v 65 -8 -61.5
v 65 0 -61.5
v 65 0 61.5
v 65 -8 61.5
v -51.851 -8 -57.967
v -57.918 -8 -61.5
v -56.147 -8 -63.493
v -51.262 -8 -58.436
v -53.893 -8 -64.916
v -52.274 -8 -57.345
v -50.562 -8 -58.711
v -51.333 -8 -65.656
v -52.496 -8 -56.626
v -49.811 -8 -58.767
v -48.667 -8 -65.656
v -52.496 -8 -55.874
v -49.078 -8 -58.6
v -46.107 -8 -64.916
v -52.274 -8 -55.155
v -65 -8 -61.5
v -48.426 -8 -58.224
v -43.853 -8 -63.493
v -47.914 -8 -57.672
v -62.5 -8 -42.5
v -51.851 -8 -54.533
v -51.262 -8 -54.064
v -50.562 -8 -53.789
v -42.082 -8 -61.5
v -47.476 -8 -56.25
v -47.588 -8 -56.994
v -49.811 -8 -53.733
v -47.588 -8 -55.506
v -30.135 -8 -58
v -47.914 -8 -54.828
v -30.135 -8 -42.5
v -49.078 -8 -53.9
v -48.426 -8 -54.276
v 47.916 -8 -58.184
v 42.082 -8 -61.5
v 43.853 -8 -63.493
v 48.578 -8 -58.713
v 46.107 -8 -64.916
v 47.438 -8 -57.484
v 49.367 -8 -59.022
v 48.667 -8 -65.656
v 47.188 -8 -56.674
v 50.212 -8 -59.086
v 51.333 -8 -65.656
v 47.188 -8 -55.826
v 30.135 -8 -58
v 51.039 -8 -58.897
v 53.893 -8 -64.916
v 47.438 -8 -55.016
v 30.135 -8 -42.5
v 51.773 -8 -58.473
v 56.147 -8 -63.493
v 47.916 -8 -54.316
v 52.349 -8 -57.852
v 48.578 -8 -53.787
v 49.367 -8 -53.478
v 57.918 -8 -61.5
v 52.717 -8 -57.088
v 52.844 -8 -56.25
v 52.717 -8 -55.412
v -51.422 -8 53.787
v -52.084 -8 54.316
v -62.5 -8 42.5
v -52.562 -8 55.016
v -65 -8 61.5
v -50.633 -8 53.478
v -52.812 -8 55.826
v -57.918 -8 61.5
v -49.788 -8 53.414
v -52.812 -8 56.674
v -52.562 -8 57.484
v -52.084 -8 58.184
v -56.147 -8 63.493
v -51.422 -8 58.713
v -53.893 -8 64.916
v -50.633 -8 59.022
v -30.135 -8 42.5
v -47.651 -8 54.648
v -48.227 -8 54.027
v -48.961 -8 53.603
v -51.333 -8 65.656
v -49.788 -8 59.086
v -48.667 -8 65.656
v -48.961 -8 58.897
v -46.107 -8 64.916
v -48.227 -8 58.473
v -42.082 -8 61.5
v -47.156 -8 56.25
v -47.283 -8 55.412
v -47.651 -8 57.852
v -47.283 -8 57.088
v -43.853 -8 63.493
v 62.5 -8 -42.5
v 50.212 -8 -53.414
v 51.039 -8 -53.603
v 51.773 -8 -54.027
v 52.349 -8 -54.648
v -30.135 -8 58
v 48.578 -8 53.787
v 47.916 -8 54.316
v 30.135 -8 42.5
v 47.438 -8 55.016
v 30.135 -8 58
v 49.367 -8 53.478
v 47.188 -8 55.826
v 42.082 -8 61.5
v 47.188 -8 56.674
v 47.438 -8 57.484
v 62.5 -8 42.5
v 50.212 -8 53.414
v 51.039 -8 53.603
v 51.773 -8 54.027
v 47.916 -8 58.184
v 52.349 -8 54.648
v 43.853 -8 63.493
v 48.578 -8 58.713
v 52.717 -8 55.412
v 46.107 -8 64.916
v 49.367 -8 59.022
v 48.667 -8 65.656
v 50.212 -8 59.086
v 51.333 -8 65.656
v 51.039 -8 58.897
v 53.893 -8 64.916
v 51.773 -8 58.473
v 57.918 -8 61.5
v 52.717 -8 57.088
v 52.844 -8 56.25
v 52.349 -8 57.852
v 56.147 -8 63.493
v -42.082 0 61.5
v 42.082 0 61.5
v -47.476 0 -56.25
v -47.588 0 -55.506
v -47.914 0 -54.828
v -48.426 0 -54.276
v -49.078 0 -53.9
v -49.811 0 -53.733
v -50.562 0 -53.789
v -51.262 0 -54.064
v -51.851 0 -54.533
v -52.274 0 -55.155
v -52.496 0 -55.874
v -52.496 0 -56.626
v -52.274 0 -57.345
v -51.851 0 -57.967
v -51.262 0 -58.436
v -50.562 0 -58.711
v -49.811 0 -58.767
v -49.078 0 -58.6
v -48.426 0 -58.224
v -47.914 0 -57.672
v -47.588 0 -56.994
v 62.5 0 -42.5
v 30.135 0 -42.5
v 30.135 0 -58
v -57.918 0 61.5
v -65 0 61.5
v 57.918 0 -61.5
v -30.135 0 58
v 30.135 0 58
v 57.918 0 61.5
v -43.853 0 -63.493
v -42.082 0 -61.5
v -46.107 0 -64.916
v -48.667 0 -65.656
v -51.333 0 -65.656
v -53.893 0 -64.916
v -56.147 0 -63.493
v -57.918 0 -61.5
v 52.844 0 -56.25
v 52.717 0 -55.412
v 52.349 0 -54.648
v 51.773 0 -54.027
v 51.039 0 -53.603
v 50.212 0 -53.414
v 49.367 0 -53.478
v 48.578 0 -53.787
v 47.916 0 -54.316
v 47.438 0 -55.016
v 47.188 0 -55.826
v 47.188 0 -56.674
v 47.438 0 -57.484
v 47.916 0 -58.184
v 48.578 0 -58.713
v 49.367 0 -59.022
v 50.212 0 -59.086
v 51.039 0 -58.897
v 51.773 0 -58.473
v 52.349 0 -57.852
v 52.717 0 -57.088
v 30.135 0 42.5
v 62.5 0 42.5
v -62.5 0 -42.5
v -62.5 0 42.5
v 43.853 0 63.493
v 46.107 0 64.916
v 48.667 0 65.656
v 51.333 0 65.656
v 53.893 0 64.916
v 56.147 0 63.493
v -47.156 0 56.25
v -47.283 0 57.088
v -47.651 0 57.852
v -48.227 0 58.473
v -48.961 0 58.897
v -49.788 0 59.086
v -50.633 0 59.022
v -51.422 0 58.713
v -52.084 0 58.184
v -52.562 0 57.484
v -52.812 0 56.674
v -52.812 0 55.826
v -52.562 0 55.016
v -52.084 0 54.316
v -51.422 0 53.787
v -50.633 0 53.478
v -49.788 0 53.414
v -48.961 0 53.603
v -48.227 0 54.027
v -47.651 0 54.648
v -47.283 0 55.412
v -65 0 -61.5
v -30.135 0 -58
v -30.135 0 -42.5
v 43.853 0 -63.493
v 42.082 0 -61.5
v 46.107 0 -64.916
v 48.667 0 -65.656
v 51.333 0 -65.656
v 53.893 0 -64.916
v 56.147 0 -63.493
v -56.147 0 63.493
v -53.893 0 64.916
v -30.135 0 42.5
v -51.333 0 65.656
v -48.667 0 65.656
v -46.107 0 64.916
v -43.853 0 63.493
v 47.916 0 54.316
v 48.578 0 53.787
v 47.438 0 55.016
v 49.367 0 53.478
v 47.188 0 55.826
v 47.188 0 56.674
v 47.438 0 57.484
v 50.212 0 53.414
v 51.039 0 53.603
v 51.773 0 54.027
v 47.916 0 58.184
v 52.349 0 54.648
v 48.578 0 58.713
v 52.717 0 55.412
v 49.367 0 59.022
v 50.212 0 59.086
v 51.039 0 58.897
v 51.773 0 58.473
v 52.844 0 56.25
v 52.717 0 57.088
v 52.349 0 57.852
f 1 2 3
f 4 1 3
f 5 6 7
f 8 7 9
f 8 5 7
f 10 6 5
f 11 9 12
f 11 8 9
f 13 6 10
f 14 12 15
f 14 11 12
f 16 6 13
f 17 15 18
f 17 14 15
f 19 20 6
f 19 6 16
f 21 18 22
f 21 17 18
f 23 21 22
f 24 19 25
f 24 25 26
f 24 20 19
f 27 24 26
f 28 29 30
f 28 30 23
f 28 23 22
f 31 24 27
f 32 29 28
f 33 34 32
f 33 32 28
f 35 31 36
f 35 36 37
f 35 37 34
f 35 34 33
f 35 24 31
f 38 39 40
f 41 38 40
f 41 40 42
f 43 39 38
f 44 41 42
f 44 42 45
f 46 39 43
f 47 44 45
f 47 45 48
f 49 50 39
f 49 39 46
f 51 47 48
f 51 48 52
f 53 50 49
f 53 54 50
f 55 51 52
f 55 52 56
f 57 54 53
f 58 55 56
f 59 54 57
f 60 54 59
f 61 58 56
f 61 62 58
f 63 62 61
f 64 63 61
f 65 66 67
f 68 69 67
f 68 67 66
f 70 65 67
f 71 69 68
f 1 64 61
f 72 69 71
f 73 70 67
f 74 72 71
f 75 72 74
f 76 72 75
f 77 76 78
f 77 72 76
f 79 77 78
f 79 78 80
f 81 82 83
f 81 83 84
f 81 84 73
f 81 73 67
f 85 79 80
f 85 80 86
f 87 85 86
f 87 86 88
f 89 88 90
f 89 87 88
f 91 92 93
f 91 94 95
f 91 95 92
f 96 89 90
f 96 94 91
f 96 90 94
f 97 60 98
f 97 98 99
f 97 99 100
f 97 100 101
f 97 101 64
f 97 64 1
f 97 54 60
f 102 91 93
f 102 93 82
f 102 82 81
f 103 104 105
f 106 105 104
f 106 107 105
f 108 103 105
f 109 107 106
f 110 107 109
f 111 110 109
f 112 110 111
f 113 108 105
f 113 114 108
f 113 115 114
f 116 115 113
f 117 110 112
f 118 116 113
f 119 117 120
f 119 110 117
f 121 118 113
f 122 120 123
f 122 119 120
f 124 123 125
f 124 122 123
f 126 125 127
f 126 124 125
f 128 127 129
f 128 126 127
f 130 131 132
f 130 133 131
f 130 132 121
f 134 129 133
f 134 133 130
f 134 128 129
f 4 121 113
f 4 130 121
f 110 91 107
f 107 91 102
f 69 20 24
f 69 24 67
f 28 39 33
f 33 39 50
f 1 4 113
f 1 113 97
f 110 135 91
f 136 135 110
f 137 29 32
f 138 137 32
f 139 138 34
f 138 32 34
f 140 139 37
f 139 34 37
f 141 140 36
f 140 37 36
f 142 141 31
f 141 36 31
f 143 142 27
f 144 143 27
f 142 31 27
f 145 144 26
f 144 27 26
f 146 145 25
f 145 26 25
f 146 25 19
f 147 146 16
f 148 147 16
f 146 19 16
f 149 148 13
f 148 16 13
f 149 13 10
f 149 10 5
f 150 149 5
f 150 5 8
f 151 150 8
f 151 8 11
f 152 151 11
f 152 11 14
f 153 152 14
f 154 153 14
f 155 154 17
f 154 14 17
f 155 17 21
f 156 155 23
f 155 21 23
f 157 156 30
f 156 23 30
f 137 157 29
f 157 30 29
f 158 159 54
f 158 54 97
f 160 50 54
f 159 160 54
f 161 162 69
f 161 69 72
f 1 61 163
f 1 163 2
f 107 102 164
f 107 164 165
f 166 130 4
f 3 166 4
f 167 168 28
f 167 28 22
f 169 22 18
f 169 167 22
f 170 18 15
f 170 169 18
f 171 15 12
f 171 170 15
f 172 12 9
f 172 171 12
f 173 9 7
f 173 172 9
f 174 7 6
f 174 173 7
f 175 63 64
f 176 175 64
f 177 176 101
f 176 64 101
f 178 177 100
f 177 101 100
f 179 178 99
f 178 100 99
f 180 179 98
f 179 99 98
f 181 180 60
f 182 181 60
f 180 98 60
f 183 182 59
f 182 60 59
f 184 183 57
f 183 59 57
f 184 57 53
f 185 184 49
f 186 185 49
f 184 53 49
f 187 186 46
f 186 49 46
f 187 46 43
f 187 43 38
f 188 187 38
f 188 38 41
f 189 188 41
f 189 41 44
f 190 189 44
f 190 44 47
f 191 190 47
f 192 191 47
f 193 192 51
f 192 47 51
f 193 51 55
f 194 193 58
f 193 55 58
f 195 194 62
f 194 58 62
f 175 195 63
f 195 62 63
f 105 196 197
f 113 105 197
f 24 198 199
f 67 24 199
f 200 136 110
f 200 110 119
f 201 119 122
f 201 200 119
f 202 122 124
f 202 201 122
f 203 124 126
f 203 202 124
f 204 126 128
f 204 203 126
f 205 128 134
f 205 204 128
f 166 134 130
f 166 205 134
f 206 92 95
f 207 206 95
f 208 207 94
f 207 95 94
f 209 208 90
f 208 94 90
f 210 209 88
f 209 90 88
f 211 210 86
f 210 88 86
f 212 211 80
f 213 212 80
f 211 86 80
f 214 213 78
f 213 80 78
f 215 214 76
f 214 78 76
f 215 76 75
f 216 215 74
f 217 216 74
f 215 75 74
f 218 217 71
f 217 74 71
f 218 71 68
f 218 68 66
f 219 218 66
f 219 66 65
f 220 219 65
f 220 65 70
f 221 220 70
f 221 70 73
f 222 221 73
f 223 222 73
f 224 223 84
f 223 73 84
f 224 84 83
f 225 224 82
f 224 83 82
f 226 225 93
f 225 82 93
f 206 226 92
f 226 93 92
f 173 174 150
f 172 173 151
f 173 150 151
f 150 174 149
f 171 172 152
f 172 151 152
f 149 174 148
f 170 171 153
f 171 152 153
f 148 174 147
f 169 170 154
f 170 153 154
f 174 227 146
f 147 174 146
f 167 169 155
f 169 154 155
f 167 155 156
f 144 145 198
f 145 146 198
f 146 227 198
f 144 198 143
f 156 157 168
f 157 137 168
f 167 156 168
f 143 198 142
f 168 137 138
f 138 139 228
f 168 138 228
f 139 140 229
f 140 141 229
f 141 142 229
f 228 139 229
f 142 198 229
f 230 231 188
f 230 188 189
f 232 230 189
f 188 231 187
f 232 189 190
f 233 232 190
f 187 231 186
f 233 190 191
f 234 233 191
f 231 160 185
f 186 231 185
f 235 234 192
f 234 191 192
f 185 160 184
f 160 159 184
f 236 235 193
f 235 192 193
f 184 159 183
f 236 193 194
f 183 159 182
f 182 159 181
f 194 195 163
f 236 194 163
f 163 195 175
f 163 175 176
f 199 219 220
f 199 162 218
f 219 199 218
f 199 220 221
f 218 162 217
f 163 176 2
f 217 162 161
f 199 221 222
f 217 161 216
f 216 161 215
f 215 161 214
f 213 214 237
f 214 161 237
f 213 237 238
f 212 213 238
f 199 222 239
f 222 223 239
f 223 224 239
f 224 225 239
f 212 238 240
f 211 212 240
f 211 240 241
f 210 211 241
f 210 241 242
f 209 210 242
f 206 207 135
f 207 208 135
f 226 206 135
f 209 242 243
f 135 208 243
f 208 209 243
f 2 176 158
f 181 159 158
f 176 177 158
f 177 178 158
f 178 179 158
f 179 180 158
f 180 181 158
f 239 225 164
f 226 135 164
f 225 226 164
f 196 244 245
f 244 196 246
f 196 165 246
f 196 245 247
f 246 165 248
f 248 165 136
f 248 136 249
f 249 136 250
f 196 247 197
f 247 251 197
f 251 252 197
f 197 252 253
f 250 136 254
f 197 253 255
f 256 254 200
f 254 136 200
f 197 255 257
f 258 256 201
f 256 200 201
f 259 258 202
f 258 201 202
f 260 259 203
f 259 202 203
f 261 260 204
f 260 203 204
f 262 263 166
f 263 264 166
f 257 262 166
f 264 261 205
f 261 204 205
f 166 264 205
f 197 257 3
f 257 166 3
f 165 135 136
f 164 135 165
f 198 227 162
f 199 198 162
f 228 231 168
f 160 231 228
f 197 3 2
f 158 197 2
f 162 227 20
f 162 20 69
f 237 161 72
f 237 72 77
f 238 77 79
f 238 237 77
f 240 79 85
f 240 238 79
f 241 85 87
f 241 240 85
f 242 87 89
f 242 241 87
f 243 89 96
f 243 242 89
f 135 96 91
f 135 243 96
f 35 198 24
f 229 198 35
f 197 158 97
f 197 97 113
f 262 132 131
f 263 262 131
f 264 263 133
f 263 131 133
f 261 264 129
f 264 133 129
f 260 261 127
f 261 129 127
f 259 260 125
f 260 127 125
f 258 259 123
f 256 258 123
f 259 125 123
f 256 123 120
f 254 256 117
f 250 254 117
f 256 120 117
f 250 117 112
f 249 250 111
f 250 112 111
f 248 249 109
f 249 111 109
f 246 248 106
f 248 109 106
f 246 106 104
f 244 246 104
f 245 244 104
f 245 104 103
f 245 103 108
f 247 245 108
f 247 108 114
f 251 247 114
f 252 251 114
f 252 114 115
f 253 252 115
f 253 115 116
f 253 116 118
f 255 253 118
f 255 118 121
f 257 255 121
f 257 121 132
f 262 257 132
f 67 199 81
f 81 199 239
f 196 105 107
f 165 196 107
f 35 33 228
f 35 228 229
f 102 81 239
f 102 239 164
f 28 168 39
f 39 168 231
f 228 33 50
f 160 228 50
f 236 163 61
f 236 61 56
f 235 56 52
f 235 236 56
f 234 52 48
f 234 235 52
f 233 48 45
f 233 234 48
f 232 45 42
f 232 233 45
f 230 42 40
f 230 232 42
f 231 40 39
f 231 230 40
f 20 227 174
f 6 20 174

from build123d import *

# Parameters (mm, degrees)
F0_W     = 130
F0_H     = 123
F0_W_2   = 125
F0_H_2   = 85
F1_DEPTH = 8
F2_R     = 2.8435
F2_R_2   = 2.524436
F3_DEPTH = 25
F4_W     = 60.26917
F4_H     = 116
F5_DEPTH = 25
F6_R     = 9.5
F6_R_2   = 2.8435
F6_R_3   = 2.524436
F7_DEPTH = 8


with BuildPart() as f1:
    # F0 (on Front) → F1 (new body)
    with BuildSketch(Plane.XZ):
        Rectangle(F0_W, F0_H)
        Rectangle(F0_W_2, F0_H_2, mode=Mode.SUBTRACT)
    extrude(amount=F1_DEPTH)

    # F2 (on face) → F3 (cut)
    with BuildSketch(Plane.XZ.offset(8)):
        with Locations((-50, 56.25)):
            Circle(F2_R)
        with Locations((50, 56.25)):
            Circle(F2_R)
        with Locations((-50, -56.25)):
            Circle(F2_R_2)
        with Locations((50, -56.25)):
            Circle(F2_R)
    extrude(amount=-F3_DEPTH, mode=Mode.SUBTRACT)

    # F4 (on face) → F5 (cut)
    with BuildSketch(Plane.XZ.offset(8)):
        Rectangle(F4_W, F4_H)
    extrude(amount=-F5_DEPTH, mode=Mode.SUBTRACT)

    # F6 (on face) → F7 (join, through all)
    with BuildSketch(Plane(origin=(0, 0, 0), x_dir=(-1, 0, 0), z_dir=(0, 1, 0))):
        with Locations((-50, 56.25)):
            Circle(F6_R)
        with Locations((-50, 56.25)):
            Circle(F6_R_2, mode=Mode.SUBTRACT)
        with Locations((50, 56.25)):
            Circle(F6_R)
        with Locations((50, 56.25)):
            Circle(F6_R_2, mode=Mode.SUBTRACT)
        with Locations((-50, -56.25)):
            Circle(F6_R)
        with Locations((-50, -56.25)):
            Circle(F6_R_2, mode=Mode.SUBTRACT)
        with Locations((50, -56.25)):
            Circle(F6_R)
        with Locations((50, -56.25)):
            Circle(F6_R_3, mode=Mode.SUBTRACT)
    extrude(amount=-F7_DEPTH)


solid = f1.part
